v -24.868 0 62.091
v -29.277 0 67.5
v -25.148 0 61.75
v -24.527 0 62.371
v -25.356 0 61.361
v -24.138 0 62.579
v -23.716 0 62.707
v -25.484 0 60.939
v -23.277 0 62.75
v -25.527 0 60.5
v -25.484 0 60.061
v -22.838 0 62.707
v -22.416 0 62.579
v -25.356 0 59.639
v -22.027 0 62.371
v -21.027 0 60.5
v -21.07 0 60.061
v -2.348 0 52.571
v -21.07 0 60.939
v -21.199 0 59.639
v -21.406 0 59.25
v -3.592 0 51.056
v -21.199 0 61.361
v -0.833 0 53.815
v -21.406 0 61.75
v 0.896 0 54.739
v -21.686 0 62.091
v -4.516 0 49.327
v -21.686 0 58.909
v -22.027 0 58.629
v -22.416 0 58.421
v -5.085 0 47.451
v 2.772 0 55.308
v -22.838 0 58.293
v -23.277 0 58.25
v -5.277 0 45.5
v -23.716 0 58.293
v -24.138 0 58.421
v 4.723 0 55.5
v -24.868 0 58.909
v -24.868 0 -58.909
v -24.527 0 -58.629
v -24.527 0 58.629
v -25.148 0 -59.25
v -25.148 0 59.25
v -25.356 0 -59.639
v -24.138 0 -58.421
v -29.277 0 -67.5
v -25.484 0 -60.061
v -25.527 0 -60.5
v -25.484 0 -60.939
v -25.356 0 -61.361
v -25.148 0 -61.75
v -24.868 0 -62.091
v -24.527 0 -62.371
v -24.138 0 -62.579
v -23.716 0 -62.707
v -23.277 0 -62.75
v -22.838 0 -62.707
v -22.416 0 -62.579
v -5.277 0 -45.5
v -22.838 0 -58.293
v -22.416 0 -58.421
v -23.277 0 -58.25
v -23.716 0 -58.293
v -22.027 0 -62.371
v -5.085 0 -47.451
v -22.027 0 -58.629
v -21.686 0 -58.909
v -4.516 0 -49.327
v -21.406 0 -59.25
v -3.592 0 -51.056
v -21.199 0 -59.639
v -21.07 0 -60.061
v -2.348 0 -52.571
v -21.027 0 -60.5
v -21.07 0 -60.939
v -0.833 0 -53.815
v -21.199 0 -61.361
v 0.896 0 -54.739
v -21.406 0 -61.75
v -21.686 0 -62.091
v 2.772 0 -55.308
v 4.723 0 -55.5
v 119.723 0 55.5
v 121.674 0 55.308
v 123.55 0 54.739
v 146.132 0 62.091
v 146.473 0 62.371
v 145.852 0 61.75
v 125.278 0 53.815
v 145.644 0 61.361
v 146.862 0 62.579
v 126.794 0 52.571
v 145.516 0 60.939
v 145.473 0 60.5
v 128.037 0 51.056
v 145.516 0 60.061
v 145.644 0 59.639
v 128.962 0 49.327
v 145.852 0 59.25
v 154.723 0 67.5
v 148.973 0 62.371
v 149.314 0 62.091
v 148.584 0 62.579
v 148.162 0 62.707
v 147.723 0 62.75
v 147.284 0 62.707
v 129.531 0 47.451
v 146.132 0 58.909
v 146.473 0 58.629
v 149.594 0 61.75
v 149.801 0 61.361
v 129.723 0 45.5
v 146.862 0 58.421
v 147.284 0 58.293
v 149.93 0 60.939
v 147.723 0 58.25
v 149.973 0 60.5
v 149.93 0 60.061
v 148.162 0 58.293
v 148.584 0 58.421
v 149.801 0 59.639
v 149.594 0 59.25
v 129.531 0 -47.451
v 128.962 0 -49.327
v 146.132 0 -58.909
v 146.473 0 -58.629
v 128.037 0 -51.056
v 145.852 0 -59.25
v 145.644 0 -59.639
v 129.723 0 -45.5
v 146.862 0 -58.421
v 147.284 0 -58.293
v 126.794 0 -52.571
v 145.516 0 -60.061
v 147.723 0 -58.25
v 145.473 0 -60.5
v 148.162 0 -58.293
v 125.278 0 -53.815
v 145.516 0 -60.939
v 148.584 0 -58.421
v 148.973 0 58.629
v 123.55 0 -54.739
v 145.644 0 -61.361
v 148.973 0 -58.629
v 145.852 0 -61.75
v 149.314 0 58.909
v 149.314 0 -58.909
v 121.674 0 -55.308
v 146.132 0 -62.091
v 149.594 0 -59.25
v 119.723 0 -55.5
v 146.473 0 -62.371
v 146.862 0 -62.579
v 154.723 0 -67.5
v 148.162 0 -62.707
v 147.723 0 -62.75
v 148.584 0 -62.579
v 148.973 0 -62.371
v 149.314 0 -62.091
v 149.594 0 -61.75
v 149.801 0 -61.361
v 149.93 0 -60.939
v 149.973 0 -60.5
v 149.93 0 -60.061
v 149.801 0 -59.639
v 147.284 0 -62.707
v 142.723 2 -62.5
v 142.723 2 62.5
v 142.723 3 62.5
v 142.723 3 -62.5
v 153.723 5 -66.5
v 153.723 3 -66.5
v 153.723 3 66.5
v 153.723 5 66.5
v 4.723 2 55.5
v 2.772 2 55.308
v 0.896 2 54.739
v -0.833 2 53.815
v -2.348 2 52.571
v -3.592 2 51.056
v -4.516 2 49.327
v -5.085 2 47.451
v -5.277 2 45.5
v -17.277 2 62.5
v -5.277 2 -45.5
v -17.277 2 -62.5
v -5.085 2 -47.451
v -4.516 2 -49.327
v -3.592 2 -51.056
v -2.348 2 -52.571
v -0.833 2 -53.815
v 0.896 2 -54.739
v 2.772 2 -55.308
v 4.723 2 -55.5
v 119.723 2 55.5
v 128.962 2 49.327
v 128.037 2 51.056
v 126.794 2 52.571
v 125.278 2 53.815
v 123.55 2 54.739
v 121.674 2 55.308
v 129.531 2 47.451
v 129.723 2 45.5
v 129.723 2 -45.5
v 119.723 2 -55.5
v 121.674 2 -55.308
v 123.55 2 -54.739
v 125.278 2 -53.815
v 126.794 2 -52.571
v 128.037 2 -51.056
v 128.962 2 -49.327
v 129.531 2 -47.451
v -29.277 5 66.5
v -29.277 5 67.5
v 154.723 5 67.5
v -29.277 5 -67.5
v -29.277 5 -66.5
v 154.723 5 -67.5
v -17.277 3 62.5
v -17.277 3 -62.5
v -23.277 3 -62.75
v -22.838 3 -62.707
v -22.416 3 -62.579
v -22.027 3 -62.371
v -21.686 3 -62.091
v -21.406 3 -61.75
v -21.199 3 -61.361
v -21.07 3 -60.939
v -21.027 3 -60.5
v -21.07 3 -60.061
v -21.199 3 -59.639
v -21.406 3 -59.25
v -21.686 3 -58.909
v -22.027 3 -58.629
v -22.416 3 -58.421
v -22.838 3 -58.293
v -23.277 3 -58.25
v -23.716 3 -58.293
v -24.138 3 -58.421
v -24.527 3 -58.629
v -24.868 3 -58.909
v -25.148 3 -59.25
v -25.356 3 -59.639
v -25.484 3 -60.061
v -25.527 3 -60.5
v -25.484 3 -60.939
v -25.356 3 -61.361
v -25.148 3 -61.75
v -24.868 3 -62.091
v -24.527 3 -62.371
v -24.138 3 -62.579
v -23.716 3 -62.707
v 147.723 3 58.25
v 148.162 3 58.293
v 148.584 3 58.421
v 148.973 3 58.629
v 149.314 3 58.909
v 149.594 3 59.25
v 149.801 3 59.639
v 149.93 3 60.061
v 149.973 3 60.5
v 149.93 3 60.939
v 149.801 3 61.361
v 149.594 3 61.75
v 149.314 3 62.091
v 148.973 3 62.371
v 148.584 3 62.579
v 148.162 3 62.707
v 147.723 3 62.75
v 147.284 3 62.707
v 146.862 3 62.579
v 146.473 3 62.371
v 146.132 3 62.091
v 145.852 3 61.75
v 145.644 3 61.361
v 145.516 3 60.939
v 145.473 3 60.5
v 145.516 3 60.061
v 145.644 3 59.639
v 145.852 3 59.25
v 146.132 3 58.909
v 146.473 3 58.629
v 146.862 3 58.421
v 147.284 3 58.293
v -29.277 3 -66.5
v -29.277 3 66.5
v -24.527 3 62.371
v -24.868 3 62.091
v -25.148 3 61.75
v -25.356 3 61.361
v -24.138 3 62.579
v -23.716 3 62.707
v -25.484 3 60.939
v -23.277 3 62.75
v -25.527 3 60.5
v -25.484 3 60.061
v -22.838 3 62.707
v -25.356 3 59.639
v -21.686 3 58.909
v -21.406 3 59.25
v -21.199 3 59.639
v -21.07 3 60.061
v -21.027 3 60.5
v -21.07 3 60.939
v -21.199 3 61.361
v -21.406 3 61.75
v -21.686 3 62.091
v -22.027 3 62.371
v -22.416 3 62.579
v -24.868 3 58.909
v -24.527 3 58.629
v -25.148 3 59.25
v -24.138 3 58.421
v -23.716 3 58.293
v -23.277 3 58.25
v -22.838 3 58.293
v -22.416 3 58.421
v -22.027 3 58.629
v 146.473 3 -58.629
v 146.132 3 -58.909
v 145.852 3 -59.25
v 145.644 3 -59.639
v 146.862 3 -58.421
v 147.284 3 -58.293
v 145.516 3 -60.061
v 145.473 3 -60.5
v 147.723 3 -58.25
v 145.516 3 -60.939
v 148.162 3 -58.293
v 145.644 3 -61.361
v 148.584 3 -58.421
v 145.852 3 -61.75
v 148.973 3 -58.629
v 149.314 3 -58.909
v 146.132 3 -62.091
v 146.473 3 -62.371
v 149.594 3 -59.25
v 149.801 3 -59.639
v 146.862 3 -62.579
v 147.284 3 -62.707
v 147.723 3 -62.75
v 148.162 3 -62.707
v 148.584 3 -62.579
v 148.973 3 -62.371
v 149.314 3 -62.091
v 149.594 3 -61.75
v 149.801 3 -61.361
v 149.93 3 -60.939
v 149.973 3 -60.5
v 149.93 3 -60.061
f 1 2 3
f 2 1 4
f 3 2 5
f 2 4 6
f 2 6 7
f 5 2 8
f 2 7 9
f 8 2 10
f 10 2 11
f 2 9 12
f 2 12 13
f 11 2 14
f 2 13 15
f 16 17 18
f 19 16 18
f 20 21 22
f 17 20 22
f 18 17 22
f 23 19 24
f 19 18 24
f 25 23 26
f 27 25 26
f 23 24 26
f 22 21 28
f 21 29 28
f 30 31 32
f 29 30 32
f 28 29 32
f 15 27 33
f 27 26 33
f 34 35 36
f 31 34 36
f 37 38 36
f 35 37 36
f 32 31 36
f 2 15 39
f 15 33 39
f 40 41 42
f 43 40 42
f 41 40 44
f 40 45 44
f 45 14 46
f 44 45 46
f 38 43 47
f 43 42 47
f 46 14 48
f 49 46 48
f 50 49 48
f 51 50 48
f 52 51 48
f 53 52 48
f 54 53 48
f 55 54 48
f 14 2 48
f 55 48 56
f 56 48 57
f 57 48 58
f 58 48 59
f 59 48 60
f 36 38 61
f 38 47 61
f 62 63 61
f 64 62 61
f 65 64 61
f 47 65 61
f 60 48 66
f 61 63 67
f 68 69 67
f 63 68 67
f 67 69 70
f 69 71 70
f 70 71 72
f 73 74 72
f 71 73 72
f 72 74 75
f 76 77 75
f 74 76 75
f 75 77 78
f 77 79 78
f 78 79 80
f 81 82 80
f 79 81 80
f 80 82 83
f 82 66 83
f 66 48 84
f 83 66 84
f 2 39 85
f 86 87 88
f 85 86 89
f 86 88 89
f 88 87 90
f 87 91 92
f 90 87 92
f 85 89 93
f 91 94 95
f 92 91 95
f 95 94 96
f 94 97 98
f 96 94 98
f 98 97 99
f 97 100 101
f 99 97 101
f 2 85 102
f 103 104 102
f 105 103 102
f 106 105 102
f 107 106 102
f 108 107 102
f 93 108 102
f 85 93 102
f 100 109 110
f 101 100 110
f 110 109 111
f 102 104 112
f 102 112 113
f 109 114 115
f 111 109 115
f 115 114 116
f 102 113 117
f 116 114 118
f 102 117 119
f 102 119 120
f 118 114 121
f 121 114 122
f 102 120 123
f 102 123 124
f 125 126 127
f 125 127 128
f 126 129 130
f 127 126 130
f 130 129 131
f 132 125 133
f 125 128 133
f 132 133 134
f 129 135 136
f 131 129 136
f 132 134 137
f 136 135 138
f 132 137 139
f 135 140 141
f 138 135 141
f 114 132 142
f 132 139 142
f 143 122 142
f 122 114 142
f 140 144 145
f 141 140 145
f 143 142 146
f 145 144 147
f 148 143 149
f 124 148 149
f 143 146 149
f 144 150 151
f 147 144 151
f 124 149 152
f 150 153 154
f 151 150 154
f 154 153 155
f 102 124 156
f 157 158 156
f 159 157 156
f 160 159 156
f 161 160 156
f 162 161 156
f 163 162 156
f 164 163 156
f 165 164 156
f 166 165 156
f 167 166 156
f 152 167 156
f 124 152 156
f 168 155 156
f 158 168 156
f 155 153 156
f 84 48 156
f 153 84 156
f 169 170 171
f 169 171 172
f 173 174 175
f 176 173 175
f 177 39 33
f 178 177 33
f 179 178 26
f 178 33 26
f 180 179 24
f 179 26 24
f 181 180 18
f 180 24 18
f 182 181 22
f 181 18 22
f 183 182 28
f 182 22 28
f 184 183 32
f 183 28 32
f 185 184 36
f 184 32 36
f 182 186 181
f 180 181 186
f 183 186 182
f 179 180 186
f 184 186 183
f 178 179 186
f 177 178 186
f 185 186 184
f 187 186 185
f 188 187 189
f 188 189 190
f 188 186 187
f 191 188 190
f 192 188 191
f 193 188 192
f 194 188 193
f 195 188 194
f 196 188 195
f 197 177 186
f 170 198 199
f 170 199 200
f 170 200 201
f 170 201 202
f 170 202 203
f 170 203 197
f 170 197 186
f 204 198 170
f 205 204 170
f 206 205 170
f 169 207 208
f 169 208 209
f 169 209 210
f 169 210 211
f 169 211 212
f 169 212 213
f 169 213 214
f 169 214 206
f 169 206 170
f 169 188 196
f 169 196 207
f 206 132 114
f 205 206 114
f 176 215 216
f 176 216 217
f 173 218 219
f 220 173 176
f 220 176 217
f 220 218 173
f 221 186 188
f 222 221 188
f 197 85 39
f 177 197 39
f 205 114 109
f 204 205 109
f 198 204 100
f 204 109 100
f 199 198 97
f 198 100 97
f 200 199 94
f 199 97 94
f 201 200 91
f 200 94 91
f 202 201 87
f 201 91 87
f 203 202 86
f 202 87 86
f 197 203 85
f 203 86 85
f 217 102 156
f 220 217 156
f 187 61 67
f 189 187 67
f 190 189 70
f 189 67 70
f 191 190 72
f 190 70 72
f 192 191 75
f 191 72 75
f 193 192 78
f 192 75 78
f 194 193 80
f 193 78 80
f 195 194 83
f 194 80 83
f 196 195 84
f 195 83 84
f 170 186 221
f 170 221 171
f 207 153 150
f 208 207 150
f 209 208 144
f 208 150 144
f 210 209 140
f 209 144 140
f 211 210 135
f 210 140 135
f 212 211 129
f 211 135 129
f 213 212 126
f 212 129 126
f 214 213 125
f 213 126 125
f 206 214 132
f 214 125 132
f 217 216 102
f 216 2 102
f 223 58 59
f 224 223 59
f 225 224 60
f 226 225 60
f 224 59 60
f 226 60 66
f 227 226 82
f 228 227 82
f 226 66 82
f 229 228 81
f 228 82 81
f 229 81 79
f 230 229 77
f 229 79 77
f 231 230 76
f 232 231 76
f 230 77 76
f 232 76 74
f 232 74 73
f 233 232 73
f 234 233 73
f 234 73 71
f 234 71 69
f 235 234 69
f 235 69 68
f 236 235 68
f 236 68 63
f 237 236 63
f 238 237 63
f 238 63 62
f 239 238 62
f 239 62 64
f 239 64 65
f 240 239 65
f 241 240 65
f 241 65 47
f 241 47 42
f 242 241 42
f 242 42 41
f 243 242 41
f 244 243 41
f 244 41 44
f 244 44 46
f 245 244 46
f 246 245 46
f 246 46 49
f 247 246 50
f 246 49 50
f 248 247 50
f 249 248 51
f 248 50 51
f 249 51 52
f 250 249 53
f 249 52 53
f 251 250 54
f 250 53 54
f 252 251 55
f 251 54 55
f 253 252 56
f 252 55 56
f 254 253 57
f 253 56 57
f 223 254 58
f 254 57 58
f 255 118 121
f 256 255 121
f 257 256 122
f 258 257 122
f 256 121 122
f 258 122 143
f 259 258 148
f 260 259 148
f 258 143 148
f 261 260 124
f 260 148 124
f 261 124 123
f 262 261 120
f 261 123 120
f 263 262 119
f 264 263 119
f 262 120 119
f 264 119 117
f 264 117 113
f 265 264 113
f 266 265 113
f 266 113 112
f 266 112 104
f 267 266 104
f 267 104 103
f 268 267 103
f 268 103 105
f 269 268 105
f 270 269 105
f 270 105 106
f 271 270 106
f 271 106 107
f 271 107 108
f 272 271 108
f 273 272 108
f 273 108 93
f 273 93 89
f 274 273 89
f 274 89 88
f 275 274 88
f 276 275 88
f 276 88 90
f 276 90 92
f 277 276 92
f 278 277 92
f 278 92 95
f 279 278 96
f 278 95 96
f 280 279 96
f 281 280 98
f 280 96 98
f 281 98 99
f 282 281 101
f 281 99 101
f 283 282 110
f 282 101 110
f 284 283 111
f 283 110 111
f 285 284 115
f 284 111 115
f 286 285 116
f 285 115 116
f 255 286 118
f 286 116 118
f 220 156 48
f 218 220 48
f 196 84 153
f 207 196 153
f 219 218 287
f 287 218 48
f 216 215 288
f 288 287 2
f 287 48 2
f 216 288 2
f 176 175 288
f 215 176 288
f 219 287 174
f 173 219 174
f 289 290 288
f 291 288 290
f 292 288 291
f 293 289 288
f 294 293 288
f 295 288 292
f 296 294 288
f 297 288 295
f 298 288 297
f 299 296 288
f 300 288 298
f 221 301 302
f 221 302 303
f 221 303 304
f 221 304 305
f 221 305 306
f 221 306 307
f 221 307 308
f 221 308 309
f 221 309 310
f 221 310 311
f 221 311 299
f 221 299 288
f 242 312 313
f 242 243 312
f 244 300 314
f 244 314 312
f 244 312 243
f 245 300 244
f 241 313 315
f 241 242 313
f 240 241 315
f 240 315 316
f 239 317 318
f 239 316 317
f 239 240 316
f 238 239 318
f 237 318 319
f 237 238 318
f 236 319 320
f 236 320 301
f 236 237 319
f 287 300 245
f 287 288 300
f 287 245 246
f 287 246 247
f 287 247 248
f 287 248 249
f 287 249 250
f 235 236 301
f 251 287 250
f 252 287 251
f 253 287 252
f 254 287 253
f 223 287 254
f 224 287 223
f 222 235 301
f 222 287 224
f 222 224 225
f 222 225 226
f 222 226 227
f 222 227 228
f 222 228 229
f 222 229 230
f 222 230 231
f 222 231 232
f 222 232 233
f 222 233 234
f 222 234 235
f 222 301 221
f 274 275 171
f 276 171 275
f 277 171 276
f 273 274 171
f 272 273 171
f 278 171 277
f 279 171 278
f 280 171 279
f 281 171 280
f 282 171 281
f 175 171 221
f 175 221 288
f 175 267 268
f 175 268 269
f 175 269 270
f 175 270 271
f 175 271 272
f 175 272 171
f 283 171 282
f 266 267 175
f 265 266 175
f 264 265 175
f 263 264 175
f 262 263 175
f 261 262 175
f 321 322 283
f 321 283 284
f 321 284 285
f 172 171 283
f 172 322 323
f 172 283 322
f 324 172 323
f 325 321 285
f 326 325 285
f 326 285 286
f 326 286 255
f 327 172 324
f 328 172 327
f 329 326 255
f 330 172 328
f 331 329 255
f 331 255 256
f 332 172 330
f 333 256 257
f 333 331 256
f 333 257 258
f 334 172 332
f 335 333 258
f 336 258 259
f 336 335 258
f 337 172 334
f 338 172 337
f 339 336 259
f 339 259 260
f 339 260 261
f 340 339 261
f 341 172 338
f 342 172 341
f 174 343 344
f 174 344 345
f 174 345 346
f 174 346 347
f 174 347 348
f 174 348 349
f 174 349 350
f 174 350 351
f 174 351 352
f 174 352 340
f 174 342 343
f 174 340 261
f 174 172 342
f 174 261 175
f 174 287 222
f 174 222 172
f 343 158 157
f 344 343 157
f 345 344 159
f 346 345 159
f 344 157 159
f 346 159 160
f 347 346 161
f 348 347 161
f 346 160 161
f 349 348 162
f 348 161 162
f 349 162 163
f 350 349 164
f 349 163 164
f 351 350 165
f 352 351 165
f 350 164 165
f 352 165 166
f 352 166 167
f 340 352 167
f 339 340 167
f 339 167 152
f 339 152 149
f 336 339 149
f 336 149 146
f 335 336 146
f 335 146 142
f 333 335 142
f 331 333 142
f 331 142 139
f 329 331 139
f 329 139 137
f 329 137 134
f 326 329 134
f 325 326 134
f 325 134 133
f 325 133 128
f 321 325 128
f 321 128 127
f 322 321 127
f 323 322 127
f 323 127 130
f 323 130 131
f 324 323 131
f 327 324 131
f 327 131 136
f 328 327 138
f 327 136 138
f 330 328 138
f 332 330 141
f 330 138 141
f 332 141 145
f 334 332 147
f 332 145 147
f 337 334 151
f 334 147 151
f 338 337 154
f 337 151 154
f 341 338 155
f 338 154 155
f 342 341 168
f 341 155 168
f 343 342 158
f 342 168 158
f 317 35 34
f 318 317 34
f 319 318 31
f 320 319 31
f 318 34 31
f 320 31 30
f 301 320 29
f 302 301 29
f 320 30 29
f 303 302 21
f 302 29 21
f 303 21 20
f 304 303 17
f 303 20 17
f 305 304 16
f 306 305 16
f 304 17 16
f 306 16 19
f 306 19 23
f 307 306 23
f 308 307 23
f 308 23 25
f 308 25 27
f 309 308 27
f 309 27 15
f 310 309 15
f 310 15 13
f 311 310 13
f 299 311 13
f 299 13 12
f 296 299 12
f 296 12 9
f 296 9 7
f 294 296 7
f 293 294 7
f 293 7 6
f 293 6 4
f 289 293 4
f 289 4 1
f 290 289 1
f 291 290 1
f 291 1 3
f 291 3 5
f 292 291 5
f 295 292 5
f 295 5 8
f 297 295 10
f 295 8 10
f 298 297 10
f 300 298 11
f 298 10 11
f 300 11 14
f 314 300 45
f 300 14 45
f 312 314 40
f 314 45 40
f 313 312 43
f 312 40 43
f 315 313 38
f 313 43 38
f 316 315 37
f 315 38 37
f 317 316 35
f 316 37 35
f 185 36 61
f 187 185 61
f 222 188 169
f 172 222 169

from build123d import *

# Parameters (mm, degrees)
SKETCH2_W           = 184
SKETCH2_H           = 135
BOSS_EXTRUDE1_DEPTH = 2
SKETCH3_W           = 184
SKETCH3_H           = 135
SKETCH3_W_2         = 160
SKETCH3_H_2         = 125
BOSS_EXTRUDE2_DEPTH = 1
BOSS_EXTRUDE3_DEPTH = 2
CUT_EXTRUDE1_REACH  = 170.88
SKETCH5_R           = 2.25


with BuildPart() as part:
    # Sketch2 → Boss-Extrude1 (new body)
    with BuildSketch(Plane(origin=(0, 0, 0), x_dir=(1, 0, 0), z_dir=(0, 1, 0))):
        with Locations((62.722752399, 0)):
            Rectangle(SKETCH2_W, SKETCH2_H)
        with BuildLine():
            Line((4.722752399, 55.5), (119.722752399, 55.5))
            ThreePointArc((119.722752399, 55.5), (126.79382021, 52.571067812), (129.722752399, 45.5))
            Line((129.722752399, 45.5), (129.722752399, -45.5))
            ThreePointArc((129.722752399, -45.5), (126.79382021, -52.571067812), (119.722752399, -55.5))
            Line((119.722752399, -55.5), (4.722752399, -55.5))
            ThreePointArc((4.722752399, -55.5), (-2.348315413, -52.571067812), (-5.277247601, -45.5))
            Line((-5.277247601, -45.5), (-5.277247601, 45.5))
            ThreePointArc((-5.277247601, 45.5), (-2.348315413, 52.571067812), (4.722752399, 55.5))
        make_face(mode=Mode.SUBTRACT)
    extrude(amount=BOSS_EXTRUDE1_DEPTH)

    # Sketch3 → Boss-Extrude2 (add)
    with BuildSketch(Plane(origin=(0, 2, 0), x_dir=(1, 0, 0), z_dir=(0, 1, 0))):
        with Locations((62.722752399, 0)):
            Rectangle(SKETCH3_W, SKETCH3_H)
        with Locations((62.722752399, 0)):
            Rectangle(SKETCH3_W_2, SKETCH3_H_2, mode=Mode.SUBTRACT)
    extrude(amount=BOSS_EXTRUDE2_DEPTH)

    # Sketch4 → Boss-Extrude3 (add)
    with BuildSketch(Plane(origin=(0, 3, 0), x_dir=(1, 0, 0), z_dir=(0, 1, 0))):
        Polygon((154.722752399, 67.5), (-29.277247601, 67.5), (-29.277247601, 66.5), (153.722752399, 66.5), (153.722752399, -66.5), (-29.277247601, -66.5), (-29.277247601, -67.5), (154.722752399, -67.5), align=None)
    extrude(amount=BOSS_EXTRUDE3_DEPTH)

    # Sketch5 → Cut-Extrude1 (cut, up to next)
    with BuildSketch(Plane.XZ, mode=Mode.PRIVATE) as cut_extrude1_sk1:
        with Locations(Location((-23.277247601, 60.5, 0), (0, 0, 270))):
            Circle(SKETCH5_R)
    cut_extrude1_tool1 = extrude(cut_extrude1_sk1.sketch, amount=-CUT_EXTRUDE1_REACH, mode=Mode.PRIVATE) & part.part
    # Sketch5 → Cut-Extrude1 (cut, up to next)
    with BuildSketch(Plane.XZ, mode=Mode.PRIVATE) as cut_extrude1_sk2:
        with Locations(Location((-23.277247601, -60.5, 0), (0, 0, 270))):
            Circle(SKETCH5_R)
    cut_extrude1_tool2 = extrude(cut_extrude1_sk2.sketch, amount=-CUT_EXTRUDE1_REACH, mode=Mode.PRIVATE) & part.part
    # Sketch5 → Cut-Extrude1 (cut, up to next)
    with BuildSketch(Plane.XZ, mode=Mode.PRIVATE) as cut_extrude1_sk3:
        with Locations(Location((147.722752399, -60.5, 0), (0, 0, 270))):
            Circle(SKETCH5_R)
    cut_extrude1_tool3 = extrude(cut_extrude1_sk3.sketch, amount=-CUT_EXTRUDE1_REACH, mode=Mode.PRIVATE) & part.part
    # Sketch5 → Cut-Extrude1 (cut, up to next)
    with BuildSketch(Plane.XZ, mode=Mode.PRIVATE) as cut_extrude1_sk4:
        with Locations(Location((147.722752399, 60.5, 0), (0, 0, 270))):
            Circle(SKETCH5_R)
    cut_extrude1_tool4 = extrude(cut_extrude1_sk4.sketch, amount=-CUT_EXTRUDE1_REACH, mode=Mode.PRIVATE) & part.part
    add(cut_extrude1_tool1.solids().sort_by_distance((-23.277248, 0, 60.5))[0], mode=Mode.SUBTRACT)
    add(cut_extrude1_tool2.solids().sort_by_distance((-23.277248, 0, -60.5))[0], mode=Mode.SUBTRACT)
    add(cut_extrude1_tool3.solids().sort_by_distance((147.722752, 0, -60.5))[0], mode=Mode.SUBTRACT)
    add(cut_extrude1_tool4.solids().sort_by_distance((147.722752, 0, 60.5))[0], mode=Mode.SUBTRACT)


solid = part.part
